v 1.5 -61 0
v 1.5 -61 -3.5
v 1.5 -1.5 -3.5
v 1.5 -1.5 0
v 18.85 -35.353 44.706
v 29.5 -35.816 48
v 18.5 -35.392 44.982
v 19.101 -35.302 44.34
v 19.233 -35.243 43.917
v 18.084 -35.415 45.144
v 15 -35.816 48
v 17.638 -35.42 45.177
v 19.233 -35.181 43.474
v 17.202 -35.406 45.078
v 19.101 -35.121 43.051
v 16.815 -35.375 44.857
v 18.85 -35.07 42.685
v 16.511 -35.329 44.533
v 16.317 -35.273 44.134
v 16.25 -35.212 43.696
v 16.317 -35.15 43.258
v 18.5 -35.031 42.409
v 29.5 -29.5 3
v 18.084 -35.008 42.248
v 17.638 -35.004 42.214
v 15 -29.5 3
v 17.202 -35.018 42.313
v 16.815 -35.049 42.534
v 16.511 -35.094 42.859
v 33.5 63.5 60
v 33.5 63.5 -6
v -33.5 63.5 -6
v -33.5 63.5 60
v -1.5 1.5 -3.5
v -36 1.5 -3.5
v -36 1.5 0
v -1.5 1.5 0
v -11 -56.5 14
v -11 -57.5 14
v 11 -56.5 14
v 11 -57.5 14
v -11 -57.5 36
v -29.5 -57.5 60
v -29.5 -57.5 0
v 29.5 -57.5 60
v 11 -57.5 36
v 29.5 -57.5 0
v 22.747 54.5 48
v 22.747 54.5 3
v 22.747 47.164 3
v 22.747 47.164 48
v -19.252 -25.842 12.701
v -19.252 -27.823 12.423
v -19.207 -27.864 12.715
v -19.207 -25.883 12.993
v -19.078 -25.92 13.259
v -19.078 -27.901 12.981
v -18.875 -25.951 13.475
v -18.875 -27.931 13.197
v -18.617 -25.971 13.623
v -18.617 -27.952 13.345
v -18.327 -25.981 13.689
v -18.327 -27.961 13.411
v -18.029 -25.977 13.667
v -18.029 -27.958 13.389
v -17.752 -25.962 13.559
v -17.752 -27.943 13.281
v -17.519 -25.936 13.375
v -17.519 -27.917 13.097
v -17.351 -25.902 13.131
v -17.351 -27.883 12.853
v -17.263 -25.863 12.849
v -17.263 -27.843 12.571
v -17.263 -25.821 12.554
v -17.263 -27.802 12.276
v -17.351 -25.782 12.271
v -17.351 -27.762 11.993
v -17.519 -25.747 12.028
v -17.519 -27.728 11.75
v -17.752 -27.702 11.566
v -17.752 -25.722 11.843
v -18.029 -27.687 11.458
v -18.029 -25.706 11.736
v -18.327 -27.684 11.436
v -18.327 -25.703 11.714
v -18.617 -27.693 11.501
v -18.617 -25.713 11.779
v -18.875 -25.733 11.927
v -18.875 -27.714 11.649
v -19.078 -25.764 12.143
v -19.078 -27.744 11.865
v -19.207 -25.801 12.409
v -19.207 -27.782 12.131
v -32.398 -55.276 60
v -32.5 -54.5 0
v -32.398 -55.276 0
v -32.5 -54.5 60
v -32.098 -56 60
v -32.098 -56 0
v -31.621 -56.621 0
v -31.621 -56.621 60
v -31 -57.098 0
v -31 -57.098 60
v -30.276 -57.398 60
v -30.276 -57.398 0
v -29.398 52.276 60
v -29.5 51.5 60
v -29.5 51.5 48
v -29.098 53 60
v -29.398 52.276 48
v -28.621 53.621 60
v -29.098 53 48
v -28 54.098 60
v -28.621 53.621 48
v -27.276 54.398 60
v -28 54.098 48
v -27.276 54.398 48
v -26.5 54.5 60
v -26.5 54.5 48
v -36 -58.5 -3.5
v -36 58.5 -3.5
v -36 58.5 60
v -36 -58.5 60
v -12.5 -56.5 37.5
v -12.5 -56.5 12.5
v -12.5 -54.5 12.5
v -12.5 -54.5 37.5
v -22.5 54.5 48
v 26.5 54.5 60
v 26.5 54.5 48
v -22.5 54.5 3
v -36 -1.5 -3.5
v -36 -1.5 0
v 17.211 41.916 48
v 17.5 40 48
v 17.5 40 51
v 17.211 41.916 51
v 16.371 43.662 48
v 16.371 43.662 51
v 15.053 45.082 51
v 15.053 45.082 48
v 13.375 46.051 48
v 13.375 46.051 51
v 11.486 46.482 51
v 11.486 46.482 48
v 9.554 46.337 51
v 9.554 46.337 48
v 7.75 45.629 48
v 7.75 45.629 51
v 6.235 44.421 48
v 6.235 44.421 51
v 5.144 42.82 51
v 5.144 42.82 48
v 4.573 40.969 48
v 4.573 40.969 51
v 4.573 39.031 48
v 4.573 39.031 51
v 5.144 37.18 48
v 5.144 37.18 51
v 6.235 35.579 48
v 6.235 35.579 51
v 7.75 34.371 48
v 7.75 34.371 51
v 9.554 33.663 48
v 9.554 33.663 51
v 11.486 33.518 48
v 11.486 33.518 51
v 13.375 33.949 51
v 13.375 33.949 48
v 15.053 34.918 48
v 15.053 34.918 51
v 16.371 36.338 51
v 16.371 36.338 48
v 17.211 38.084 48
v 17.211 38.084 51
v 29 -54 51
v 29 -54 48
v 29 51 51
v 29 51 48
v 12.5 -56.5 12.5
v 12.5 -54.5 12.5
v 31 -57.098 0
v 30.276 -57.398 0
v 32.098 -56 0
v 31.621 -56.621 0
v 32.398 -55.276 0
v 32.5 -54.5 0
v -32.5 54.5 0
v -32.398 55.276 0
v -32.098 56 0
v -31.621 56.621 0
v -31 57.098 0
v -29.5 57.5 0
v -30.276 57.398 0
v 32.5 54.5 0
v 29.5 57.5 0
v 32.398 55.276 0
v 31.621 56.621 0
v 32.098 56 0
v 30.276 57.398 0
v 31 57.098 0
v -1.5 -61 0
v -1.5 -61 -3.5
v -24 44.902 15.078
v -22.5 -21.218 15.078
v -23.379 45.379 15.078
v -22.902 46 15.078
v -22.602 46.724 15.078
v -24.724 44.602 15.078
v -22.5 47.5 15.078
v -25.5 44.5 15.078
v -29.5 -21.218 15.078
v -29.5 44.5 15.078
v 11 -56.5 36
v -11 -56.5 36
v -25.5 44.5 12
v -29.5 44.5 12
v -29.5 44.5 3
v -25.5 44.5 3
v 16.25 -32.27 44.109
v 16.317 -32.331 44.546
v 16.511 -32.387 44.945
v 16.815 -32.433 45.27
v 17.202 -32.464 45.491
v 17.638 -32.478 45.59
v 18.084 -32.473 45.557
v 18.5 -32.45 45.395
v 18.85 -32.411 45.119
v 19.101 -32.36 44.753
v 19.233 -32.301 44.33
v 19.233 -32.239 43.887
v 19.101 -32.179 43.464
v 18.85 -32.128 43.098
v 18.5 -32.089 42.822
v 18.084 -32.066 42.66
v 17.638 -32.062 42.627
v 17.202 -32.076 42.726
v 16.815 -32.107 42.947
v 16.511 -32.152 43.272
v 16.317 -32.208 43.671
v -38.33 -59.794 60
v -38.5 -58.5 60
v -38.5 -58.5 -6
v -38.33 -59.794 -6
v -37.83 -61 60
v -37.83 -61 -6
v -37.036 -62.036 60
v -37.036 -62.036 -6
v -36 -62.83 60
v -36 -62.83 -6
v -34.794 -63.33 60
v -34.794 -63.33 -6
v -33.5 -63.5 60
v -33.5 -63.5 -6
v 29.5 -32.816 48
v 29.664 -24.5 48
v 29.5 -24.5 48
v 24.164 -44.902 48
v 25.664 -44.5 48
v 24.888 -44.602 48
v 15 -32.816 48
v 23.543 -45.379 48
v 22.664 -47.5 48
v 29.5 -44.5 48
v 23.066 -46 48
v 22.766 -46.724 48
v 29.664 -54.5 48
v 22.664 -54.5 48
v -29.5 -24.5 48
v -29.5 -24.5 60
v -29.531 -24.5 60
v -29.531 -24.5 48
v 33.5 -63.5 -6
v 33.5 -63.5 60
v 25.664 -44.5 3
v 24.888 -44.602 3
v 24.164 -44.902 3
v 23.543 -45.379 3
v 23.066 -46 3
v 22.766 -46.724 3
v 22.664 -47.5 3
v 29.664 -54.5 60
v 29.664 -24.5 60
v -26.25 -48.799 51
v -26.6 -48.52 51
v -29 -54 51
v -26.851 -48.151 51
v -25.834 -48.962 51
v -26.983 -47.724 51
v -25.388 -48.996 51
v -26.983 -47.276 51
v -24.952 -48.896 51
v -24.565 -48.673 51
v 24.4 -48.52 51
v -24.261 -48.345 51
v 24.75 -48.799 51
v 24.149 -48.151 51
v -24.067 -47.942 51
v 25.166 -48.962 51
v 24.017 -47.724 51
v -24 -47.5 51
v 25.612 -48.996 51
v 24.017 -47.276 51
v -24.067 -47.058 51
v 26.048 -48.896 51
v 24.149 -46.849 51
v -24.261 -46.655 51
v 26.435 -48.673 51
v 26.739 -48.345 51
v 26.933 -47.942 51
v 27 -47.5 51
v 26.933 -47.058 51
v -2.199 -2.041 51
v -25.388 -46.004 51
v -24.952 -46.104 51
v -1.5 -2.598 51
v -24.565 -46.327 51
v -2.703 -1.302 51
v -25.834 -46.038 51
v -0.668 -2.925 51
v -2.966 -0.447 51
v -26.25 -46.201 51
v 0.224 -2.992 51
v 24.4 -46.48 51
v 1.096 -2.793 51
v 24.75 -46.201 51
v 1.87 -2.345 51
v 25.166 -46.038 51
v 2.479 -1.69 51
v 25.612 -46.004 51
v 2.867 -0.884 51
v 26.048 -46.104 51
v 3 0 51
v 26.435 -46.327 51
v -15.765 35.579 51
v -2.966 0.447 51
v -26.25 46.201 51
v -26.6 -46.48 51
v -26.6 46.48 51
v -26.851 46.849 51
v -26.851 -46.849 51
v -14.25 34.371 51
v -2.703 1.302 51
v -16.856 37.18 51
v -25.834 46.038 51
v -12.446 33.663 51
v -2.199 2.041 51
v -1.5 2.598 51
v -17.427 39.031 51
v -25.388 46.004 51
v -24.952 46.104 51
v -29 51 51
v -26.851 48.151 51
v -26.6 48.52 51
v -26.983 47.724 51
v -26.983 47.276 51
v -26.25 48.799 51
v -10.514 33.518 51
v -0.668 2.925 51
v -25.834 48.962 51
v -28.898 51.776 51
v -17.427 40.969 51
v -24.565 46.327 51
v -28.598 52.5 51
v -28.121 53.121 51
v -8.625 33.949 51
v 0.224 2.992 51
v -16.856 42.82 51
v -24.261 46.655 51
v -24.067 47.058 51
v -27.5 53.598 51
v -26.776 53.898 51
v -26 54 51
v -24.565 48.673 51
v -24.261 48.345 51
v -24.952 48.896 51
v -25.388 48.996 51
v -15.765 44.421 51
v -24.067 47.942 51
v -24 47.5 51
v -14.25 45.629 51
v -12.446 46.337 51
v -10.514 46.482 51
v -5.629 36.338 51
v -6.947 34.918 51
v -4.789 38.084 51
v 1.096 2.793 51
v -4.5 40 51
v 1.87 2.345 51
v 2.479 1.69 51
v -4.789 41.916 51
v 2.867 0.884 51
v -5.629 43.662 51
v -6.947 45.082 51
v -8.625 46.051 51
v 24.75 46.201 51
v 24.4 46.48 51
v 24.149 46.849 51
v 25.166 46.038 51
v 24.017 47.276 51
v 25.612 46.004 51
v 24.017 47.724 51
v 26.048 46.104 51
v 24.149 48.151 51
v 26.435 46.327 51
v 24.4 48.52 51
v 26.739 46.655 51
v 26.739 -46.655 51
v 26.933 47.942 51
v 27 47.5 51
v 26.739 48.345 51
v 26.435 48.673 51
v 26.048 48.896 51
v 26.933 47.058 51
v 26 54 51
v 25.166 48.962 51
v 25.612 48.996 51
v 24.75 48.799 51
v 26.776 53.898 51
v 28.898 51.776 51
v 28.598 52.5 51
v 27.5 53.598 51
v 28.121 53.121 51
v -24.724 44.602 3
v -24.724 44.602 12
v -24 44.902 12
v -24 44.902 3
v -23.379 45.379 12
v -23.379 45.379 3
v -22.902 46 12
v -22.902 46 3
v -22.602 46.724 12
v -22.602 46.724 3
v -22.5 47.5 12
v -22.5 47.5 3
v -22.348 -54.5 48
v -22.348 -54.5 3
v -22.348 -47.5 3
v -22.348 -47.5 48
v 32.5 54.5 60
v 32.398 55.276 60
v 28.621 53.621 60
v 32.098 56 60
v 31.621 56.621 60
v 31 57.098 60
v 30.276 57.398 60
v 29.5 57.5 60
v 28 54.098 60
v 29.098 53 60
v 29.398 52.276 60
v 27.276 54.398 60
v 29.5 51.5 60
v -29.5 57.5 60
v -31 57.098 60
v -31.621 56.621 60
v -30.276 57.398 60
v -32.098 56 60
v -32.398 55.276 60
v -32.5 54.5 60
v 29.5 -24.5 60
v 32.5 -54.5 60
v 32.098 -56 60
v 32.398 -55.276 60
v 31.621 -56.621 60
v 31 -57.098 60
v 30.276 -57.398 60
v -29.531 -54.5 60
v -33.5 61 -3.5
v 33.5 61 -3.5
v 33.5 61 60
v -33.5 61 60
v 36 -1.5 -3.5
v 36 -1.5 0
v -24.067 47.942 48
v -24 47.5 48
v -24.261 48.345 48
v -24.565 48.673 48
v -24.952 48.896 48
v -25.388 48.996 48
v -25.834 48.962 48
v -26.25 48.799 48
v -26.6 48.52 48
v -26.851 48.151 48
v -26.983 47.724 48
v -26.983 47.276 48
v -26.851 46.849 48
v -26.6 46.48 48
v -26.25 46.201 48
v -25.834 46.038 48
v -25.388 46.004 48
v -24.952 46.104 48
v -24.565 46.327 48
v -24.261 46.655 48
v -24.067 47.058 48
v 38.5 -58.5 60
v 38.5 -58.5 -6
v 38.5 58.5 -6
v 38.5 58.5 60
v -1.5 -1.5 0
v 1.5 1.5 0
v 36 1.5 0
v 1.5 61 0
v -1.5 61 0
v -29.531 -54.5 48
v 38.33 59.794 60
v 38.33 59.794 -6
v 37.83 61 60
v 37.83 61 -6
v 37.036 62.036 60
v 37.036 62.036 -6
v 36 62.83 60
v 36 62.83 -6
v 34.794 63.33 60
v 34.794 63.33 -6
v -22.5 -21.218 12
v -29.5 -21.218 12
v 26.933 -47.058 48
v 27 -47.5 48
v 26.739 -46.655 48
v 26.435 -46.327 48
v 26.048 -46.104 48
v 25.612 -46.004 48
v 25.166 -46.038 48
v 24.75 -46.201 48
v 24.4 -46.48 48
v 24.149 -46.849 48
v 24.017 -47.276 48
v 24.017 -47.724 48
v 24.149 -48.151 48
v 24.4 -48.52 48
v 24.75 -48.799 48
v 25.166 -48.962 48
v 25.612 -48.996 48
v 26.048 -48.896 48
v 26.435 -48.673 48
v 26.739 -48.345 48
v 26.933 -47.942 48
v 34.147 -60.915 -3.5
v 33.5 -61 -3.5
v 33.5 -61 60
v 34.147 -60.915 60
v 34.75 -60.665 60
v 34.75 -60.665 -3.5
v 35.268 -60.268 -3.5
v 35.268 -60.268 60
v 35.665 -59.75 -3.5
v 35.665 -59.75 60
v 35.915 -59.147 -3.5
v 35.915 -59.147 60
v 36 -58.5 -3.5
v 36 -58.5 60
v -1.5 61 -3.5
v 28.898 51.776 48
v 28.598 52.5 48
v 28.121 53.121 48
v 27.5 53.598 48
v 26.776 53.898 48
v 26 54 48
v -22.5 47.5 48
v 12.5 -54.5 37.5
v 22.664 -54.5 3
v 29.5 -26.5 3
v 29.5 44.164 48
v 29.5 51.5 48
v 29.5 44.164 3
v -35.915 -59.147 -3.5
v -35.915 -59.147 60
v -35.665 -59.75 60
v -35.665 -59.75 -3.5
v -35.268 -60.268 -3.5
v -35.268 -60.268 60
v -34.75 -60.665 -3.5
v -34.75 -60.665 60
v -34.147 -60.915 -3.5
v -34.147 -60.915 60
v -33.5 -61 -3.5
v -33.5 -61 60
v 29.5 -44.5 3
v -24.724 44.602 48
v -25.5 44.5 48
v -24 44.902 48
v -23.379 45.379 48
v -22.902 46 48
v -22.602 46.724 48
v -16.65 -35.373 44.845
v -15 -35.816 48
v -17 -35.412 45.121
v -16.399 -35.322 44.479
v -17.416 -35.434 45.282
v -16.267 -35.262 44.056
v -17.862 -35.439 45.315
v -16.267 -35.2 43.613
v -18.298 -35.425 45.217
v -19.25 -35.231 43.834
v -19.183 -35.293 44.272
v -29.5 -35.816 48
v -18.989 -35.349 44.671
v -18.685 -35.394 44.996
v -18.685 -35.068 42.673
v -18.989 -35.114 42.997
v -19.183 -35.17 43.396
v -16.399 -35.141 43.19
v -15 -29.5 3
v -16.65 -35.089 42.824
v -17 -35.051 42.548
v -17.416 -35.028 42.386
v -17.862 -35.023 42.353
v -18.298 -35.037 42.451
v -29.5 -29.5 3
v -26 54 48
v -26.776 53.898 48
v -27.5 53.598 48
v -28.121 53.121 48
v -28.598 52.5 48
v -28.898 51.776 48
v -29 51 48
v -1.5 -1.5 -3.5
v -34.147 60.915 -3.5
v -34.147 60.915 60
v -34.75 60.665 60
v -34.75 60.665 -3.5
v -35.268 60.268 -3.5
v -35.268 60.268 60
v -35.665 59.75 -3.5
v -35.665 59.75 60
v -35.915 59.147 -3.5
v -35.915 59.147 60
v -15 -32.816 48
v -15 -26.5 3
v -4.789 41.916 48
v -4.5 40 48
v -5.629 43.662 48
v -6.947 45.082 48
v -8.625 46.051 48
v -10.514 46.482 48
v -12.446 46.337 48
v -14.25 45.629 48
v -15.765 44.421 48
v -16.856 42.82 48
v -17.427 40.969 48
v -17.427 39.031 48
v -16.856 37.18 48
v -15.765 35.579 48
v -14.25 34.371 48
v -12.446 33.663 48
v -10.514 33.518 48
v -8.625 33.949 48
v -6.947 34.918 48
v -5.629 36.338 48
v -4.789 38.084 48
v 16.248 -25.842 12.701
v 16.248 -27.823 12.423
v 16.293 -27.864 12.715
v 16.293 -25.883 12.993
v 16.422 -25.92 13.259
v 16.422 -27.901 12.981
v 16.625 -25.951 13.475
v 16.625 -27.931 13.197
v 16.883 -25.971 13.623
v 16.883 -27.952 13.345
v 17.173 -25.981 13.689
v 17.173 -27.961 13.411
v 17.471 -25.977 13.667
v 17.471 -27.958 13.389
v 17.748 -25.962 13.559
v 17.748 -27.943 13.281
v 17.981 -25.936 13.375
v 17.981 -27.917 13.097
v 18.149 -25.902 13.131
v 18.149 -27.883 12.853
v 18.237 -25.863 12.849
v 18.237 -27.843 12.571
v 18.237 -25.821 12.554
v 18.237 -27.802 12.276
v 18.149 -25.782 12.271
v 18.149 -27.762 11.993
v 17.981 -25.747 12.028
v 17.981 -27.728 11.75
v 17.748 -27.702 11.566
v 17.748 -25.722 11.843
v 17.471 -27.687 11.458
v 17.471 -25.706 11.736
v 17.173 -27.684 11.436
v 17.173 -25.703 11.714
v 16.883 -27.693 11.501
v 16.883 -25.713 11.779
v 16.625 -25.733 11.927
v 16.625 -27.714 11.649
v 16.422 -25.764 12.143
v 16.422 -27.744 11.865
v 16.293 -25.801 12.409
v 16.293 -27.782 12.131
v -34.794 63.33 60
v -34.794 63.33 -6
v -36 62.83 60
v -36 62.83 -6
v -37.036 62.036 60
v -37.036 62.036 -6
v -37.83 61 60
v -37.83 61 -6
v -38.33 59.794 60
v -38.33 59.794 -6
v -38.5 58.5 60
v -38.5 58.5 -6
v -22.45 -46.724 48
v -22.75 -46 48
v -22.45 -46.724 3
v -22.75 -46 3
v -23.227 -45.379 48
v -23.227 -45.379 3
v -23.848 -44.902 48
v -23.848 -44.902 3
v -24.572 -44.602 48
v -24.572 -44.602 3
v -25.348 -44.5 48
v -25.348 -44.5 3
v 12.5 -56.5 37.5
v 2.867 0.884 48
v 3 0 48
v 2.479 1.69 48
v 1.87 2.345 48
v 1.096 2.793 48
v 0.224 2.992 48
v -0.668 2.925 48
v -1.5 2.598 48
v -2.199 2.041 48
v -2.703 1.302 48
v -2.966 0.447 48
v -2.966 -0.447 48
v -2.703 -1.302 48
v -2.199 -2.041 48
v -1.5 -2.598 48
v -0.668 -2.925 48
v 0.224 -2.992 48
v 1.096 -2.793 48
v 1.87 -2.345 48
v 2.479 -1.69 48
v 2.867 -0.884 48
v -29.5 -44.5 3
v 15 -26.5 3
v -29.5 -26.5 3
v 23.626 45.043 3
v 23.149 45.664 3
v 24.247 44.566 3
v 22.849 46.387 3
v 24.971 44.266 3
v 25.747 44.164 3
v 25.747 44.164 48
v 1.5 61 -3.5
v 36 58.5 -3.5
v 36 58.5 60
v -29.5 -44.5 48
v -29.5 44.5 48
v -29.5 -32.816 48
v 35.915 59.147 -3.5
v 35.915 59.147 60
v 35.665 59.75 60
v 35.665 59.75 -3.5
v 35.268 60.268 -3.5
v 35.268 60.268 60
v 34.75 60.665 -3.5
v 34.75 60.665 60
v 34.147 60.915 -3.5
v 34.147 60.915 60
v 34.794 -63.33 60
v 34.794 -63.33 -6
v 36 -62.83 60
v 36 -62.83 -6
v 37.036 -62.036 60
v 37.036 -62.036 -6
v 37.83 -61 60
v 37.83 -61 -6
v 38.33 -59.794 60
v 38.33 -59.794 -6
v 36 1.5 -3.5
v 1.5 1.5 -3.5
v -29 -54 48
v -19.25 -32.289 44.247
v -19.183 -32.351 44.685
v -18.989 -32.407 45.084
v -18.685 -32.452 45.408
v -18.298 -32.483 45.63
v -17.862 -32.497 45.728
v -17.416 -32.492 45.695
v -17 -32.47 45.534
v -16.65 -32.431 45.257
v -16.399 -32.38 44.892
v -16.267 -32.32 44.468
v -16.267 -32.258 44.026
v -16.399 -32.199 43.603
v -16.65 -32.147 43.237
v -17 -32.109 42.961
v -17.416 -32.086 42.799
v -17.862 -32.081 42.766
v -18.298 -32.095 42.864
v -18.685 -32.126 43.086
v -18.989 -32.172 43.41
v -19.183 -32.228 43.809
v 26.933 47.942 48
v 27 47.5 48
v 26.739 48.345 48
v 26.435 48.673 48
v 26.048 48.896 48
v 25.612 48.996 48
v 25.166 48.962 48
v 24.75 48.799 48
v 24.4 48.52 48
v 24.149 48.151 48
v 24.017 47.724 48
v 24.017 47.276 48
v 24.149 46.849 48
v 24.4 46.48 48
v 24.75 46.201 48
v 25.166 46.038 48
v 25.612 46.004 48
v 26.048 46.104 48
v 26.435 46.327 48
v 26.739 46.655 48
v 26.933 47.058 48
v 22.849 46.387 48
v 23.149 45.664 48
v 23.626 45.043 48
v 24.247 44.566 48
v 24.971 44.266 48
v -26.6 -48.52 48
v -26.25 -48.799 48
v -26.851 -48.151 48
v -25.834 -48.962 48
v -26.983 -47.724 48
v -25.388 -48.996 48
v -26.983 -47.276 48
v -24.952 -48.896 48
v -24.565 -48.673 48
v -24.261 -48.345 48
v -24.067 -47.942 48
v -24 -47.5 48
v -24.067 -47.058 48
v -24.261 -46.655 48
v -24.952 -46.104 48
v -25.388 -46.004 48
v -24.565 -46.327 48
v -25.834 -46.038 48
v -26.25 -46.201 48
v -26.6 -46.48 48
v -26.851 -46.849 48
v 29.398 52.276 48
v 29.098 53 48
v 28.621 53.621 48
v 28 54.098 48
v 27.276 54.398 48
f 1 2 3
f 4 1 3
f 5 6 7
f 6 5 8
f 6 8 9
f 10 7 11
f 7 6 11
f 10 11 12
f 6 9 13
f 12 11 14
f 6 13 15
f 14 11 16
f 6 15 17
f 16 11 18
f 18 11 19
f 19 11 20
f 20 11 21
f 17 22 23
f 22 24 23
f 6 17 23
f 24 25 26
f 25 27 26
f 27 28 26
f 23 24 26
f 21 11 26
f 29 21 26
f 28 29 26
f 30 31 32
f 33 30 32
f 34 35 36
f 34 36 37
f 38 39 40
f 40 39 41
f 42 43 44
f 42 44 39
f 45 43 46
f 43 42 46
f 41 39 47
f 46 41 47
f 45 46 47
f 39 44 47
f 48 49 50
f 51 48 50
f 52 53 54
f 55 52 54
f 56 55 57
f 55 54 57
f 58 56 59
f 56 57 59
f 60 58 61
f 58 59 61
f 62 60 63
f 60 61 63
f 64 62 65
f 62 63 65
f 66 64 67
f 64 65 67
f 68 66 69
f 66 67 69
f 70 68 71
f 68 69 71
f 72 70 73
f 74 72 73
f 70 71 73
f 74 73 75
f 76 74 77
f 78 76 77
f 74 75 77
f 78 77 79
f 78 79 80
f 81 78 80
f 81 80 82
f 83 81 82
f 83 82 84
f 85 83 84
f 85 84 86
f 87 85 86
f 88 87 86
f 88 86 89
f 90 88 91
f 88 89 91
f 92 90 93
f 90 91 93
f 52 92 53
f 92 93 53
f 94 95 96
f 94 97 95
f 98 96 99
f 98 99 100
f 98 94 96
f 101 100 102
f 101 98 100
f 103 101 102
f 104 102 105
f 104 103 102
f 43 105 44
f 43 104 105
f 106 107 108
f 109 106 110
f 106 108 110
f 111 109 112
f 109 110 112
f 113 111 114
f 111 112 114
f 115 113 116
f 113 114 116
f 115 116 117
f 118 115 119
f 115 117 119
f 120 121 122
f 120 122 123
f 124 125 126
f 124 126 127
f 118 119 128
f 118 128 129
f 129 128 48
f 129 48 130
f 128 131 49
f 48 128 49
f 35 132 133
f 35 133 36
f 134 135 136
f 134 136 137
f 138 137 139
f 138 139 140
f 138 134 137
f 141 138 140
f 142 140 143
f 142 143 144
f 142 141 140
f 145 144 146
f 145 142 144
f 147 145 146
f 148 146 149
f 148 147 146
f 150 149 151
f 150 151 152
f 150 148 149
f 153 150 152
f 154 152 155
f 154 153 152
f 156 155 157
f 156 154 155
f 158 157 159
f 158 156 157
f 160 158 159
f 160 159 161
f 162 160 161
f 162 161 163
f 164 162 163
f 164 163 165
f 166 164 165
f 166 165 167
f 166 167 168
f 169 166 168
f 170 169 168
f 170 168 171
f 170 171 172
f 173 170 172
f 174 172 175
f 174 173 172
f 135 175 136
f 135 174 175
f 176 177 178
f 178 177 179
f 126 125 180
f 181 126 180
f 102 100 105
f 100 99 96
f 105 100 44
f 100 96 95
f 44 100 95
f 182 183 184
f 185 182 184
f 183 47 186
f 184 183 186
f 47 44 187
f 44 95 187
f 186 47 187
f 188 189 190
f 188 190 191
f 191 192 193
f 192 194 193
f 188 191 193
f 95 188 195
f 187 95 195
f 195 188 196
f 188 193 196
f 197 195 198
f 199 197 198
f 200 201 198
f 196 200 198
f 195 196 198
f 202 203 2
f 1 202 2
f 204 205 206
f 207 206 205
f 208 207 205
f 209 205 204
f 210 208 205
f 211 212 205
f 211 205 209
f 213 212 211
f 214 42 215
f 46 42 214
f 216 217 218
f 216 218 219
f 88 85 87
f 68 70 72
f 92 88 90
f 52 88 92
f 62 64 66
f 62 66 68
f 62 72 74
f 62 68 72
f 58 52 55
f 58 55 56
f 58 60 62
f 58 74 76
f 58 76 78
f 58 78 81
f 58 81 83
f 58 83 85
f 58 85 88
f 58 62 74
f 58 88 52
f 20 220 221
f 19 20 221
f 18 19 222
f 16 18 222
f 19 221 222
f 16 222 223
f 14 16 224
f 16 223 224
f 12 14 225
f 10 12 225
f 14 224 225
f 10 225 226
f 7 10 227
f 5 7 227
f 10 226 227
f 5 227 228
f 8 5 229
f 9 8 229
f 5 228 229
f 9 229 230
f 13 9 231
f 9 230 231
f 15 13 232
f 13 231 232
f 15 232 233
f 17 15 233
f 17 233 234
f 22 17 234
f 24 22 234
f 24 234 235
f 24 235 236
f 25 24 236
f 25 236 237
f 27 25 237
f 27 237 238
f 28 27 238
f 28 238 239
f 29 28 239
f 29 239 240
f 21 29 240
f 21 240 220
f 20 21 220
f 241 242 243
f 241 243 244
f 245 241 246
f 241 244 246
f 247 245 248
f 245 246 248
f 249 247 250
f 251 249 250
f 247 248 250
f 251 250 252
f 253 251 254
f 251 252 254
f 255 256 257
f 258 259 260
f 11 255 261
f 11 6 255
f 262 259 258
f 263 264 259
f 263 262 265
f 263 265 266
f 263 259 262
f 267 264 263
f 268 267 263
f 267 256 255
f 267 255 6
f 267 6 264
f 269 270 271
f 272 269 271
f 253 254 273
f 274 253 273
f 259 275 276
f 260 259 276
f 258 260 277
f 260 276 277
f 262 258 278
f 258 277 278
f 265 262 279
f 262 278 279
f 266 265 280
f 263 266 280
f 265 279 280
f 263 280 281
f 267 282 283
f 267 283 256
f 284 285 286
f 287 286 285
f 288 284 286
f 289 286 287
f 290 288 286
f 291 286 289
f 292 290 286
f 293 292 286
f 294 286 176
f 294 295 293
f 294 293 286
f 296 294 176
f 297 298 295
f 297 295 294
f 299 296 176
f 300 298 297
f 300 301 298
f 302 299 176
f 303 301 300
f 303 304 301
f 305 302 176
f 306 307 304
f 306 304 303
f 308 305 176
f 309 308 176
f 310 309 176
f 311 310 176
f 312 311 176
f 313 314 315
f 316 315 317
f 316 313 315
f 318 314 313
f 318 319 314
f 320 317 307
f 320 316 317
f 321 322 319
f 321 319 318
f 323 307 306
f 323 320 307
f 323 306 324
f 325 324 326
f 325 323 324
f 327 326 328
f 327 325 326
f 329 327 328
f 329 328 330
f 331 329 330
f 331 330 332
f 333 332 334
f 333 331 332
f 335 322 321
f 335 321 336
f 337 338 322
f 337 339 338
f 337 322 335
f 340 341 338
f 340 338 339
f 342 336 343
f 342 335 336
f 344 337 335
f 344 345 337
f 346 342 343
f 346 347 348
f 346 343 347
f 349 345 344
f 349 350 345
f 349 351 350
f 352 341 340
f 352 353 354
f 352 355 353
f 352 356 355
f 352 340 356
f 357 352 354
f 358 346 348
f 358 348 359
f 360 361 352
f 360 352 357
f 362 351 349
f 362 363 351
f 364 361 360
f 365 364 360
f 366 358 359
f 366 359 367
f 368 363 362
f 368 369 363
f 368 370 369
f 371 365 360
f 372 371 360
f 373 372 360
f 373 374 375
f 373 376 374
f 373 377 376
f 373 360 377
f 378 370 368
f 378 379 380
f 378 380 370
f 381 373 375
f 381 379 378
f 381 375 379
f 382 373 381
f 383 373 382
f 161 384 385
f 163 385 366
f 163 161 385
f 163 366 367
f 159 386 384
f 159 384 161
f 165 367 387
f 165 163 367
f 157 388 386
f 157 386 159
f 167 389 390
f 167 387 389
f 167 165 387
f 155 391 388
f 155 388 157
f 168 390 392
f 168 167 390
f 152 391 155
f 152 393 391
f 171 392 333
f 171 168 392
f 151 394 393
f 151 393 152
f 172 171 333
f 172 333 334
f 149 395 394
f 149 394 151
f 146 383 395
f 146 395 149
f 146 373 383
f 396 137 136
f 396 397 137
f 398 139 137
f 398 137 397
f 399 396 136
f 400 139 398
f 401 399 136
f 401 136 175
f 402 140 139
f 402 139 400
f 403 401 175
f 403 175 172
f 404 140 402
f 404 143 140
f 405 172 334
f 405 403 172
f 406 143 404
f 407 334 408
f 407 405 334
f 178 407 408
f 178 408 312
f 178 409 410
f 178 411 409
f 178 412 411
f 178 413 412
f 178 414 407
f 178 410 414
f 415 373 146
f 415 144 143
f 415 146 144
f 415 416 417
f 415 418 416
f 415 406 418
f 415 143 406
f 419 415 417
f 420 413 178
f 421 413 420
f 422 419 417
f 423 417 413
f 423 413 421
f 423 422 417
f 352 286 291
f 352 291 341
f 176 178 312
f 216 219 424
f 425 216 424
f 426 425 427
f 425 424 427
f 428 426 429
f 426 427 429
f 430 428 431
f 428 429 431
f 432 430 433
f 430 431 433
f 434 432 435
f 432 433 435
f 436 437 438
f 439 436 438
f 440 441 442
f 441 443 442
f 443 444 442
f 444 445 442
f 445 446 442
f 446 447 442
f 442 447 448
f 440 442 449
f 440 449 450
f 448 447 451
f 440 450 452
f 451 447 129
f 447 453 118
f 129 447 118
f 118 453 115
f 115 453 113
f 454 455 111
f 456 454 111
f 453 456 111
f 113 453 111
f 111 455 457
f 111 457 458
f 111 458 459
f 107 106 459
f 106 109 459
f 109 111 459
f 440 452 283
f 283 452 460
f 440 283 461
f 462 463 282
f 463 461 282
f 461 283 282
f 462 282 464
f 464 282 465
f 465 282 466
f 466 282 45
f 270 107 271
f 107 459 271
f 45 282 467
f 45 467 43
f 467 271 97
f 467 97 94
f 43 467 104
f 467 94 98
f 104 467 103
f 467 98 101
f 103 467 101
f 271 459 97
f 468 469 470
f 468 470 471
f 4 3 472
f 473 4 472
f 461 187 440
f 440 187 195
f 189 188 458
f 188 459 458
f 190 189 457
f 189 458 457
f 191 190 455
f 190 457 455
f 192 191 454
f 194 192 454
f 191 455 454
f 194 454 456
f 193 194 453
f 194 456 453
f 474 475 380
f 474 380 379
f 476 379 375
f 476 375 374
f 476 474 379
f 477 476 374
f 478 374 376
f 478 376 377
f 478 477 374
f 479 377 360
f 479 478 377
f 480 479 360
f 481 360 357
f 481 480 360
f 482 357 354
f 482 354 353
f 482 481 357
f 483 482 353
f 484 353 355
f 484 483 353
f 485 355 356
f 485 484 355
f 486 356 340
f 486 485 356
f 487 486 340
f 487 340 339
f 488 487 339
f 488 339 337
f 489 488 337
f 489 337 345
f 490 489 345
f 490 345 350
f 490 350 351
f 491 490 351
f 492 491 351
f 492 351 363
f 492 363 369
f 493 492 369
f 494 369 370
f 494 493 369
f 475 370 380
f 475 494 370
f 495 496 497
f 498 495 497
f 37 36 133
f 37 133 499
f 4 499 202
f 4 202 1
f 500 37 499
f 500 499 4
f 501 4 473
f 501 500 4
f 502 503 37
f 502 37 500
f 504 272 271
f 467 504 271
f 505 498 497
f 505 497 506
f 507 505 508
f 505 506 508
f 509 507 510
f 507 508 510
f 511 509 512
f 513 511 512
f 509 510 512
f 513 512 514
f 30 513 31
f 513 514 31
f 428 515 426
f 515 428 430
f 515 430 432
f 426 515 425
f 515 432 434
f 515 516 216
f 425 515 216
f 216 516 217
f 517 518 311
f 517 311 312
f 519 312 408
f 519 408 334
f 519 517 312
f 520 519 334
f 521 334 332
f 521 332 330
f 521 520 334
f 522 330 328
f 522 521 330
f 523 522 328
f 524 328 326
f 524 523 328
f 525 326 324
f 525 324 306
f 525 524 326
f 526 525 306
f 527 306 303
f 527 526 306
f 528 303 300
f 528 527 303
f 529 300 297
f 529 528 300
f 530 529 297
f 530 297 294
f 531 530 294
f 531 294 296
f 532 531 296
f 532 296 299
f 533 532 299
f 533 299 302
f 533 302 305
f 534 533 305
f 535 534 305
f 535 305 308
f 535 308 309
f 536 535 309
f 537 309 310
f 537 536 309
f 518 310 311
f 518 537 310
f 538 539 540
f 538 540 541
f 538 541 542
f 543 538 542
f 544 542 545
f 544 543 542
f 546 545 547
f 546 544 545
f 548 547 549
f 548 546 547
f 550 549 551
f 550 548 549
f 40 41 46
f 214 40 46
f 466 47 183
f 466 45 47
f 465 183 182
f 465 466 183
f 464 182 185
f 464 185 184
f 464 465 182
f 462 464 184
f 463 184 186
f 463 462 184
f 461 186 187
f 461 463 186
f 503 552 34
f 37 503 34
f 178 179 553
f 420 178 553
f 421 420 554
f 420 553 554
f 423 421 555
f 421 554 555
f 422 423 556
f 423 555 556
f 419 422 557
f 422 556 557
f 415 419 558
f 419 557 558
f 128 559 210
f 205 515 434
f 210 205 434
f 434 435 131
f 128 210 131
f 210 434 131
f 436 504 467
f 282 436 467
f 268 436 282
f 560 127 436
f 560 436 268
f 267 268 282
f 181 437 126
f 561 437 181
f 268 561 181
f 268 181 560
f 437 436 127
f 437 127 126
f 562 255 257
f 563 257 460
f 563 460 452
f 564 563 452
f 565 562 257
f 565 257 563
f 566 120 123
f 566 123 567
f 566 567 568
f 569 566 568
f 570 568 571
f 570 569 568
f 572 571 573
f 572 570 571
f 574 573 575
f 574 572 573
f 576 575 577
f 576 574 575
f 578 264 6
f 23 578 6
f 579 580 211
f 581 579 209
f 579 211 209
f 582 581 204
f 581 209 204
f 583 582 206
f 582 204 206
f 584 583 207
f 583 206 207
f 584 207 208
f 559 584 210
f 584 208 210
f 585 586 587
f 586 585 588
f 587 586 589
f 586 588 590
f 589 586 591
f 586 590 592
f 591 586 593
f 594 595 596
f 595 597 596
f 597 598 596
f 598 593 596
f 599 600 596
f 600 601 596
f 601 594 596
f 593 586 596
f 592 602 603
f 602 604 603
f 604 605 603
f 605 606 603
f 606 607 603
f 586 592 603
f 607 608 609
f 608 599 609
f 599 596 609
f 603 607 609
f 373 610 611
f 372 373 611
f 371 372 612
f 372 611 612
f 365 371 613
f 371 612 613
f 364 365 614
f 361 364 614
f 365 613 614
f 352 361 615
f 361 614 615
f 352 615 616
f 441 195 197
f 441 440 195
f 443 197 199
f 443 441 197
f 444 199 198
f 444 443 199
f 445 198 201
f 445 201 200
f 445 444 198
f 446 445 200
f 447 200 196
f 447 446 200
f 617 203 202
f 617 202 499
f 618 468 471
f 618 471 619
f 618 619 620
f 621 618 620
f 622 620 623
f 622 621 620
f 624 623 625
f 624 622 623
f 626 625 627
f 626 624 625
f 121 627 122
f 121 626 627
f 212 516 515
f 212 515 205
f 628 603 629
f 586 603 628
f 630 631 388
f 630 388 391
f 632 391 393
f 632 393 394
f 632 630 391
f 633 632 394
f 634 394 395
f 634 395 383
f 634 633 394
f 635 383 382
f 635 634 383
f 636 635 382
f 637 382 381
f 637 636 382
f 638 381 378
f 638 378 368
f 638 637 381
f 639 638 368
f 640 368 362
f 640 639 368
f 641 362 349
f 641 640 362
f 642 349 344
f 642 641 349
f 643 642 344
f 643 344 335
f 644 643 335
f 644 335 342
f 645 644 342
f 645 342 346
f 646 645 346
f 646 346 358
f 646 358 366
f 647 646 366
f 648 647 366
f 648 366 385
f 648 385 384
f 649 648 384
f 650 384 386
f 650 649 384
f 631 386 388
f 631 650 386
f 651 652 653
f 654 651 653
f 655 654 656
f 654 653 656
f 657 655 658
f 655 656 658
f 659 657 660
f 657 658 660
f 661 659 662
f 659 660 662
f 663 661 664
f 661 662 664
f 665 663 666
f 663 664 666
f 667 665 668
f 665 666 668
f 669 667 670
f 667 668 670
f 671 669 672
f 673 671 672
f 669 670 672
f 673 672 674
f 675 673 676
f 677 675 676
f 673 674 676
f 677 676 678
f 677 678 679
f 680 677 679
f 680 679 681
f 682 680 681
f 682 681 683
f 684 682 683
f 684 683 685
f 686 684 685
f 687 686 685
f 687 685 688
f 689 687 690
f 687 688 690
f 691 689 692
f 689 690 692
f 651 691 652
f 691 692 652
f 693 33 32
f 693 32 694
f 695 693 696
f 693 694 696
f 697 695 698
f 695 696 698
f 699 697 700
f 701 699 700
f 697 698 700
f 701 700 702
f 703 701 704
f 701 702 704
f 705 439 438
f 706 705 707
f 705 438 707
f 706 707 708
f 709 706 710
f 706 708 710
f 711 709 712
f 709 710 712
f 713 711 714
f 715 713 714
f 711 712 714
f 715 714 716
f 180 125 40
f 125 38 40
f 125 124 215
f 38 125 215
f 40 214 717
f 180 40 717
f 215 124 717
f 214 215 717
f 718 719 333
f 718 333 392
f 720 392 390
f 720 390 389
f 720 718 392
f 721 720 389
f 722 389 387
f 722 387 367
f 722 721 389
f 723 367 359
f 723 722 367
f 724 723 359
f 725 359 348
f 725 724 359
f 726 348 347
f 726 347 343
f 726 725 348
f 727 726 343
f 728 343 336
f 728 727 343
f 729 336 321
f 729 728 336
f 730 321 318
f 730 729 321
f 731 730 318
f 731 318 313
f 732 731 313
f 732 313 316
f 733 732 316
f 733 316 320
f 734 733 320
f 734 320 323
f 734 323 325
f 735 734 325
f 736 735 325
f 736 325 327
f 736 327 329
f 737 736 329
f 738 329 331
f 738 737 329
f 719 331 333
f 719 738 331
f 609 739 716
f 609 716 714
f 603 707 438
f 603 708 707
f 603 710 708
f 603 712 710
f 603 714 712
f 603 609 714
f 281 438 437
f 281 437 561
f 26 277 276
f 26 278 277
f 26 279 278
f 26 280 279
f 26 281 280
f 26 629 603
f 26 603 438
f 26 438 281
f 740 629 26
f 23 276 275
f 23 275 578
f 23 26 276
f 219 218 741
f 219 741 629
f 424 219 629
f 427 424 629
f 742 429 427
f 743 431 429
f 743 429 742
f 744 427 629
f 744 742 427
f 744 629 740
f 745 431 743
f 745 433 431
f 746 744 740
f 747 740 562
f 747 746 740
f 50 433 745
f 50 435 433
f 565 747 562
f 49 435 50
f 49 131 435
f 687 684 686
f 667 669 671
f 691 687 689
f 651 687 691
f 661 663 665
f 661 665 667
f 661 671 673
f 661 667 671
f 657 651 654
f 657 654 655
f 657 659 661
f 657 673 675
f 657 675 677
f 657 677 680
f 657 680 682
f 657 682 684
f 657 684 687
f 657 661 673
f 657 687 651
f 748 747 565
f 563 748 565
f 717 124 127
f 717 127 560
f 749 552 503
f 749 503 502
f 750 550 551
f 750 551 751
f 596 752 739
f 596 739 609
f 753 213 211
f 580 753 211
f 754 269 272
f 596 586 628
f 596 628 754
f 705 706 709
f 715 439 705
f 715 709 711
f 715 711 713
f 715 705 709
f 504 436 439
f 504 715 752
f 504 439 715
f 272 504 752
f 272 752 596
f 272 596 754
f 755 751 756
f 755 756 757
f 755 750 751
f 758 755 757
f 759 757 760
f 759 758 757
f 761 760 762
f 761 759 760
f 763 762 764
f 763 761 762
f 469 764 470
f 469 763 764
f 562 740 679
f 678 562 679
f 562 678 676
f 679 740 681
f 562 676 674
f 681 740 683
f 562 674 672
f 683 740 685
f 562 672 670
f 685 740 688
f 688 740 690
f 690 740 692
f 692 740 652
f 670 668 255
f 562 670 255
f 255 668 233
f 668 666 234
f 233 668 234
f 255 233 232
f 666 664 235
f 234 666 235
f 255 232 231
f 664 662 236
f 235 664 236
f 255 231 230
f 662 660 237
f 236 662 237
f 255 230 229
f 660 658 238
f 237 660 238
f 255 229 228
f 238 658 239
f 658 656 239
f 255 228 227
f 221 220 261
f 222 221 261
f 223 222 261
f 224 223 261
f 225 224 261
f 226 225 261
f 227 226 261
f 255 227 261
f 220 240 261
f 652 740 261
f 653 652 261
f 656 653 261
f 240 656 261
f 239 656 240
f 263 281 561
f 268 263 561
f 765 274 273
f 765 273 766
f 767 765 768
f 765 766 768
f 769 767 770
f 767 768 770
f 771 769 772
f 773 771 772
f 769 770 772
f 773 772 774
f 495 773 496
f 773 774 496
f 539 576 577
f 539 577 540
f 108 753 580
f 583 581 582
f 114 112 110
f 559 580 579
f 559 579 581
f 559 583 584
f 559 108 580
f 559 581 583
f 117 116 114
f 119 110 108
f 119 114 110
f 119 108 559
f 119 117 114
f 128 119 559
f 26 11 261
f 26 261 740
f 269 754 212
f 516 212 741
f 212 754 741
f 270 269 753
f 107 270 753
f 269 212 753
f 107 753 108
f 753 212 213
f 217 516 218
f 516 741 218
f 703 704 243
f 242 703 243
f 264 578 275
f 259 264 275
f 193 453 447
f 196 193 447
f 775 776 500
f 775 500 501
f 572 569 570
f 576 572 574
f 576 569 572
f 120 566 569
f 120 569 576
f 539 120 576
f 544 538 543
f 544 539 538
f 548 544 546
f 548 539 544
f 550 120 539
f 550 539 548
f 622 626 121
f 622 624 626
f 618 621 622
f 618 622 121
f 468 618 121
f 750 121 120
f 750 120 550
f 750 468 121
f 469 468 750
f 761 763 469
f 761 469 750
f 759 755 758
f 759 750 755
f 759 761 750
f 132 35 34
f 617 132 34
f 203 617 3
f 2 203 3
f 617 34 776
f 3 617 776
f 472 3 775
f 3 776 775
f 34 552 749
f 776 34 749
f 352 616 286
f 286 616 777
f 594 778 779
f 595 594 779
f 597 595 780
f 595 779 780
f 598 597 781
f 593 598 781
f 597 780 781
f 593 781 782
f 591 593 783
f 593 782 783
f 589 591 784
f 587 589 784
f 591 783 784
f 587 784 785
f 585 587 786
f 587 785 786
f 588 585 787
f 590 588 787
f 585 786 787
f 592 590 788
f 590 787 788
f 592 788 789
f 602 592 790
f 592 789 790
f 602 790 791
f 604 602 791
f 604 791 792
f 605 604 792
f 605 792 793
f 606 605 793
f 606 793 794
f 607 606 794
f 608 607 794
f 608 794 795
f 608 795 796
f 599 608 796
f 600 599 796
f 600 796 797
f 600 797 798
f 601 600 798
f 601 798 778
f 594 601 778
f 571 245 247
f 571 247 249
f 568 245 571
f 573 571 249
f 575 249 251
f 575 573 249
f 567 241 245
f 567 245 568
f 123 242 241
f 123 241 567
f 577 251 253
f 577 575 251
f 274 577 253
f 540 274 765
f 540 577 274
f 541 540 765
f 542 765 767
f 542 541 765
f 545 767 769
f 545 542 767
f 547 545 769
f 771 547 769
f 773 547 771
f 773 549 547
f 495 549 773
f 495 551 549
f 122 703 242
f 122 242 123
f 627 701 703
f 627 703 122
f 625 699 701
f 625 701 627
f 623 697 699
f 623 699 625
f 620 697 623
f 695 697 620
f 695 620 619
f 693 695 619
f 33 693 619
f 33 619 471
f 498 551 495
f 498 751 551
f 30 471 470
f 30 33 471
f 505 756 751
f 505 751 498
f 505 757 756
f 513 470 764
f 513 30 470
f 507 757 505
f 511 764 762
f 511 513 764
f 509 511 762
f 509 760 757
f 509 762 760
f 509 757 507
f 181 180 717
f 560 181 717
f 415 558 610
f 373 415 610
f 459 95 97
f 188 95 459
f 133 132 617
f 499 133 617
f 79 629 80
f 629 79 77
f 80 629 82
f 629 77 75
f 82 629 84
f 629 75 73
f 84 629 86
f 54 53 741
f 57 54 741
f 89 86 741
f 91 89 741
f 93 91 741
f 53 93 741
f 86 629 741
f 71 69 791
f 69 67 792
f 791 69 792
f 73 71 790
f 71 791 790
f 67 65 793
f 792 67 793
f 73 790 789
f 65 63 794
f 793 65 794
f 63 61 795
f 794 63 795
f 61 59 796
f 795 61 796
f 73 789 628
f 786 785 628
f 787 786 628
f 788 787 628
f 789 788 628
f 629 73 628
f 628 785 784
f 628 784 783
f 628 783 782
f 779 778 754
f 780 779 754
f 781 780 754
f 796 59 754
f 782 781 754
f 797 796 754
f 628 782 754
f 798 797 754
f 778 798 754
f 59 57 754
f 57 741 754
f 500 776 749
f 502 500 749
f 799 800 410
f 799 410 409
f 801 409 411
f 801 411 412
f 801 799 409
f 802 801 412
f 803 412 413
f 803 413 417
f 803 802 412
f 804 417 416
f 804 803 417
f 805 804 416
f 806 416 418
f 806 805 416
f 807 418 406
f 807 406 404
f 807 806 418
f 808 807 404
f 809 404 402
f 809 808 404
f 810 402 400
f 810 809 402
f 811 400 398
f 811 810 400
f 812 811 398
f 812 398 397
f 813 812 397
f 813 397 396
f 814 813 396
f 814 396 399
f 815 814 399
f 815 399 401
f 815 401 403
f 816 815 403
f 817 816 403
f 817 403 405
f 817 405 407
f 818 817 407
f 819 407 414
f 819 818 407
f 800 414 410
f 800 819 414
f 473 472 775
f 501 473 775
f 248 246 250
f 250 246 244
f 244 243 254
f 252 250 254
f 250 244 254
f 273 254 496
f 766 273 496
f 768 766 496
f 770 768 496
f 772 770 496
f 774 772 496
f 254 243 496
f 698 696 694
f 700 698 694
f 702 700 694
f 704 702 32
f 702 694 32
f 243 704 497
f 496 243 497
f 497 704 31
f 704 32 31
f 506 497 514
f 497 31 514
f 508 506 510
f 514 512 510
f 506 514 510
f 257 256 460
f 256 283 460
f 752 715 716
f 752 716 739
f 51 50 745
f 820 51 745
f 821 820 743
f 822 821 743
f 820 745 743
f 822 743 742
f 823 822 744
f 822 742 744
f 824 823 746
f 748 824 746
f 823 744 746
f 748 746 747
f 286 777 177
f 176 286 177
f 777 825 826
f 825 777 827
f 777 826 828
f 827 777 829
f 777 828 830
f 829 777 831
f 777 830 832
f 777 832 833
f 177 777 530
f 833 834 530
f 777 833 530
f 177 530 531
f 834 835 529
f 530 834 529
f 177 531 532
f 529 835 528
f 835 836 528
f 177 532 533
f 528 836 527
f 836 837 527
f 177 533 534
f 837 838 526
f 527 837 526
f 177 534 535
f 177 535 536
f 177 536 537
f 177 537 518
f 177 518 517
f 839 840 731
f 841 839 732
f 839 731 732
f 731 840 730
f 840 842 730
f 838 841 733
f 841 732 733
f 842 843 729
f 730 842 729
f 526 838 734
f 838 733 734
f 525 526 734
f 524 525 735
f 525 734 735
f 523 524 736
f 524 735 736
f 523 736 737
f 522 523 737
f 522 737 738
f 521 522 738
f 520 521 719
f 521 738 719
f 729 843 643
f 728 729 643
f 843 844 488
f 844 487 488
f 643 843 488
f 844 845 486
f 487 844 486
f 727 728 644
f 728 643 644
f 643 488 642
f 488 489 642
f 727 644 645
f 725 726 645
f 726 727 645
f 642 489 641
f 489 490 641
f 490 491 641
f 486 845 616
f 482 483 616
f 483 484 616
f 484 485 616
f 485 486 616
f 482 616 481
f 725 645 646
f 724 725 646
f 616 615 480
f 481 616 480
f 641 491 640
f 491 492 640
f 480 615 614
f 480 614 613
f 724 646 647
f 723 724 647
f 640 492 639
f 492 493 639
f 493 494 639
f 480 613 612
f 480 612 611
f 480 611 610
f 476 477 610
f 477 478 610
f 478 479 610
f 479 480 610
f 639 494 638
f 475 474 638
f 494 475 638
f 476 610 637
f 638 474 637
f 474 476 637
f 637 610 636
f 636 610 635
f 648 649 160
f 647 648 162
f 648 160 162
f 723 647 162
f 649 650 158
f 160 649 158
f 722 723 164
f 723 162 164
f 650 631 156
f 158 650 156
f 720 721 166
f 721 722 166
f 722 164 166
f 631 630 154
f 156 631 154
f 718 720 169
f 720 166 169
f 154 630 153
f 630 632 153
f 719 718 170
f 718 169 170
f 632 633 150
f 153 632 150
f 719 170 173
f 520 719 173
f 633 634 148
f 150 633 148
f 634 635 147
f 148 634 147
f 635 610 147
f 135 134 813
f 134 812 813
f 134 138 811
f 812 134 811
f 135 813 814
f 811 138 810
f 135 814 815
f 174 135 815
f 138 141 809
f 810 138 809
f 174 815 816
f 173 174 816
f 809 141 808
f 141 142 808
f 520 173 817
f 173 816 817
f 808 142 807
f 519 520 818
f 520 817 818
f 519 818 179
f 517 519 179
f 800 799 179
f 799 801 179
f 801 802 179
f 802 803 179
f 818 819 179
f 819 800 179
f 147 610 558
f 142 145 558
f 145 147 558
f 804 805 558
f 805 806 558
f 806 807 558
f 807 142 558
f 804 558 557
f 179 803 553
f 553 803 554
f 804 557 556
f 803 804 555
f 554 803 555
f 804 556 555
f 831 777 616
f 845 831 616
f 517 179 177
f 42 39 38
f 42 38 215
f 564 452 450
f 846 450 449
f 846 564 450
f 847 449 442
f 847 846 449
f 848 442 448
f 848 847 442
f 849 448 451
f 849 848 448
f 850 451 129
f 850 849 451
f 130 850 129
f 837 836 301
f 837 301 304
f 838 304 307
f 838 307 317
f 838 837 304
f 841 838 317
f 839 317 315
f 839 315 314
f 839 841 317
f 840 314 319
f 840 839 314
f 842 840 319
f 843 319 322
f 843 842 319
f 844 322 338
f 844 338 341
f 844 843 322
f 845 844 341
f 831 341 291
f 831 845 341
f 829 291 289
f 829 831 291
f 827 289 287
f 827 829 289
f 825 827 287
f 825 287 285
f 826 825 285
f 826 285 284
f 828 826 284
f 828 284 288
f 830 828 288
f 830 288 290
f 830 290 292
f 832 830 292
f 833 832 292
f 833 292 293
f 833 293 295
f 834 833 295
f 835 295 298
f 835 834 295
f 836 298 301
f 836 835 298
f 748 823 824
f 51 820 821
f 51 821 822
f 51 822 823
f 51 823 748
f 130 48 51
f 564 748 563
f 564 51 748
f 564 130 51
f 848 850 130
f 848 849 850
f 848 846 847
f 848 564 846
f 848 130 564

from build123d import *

# Parameters (mm, degrees)
F2_DEPTH  = 66
F3_T      = -2.5
F4_W      = 65
F4_H      = 115
F5_DEPTH  = 60
F6_T      = -3
F7_R      = 3
F9_DEPTH  = 60
F11_DEPTH = 30
F12_W     = 25
F12_H     = 25
F13_DEPTH = 25
F14_W     = 30.3293950856
F14_H     = 30.3293950856
F14_W_2   = 22
F14_H_2   = 22
F15_DEPTH = 1
F16_R     = 1.5
F17_DEPTH = 5
F18_R     = 1
F19_DEPTH = 2
F20_W     = 75.8937858045
F20_H     = 3.0775591731
F21_DEPTH = 7
F23_DEPTH = 45
F24_R     = 1.5
F24_R_2   = 6.5
F24_R_3   = 3
F25_DEPTH = 3
F26_W     = 3
F26_H     = 59.5
F26_H_2   = 3
F26_W_2   = 34.5
F27_DEPTH = 3.5


with BuildPart() as f2:
    # F1 (on offset) → F2 (new body)
    with BuildSketch(Plane.XY.offset(-6)):
        with BuildLine():
            Line((33.5, 63.5), (-33.5, 63.5))
            ThreePointArc((-33.5, 63.5), (-37.0355339059, 62.0355339059), (-38.5, 58.5))
            Line((-38.5, 58.5), (-38.5, -58.5))
            ThreePointArc((-38.5, -58.5), (-37.0355339059, -62.0355339059), (-33.5, -63.5))
            Line((-33.5, -63.5), (33.5, -63.5))
            ThreePointArc((33.5, -63.5), (37.0355339059, -62.0355339059), (38.5, -58.5))
            Line((38.5, -58.5), (38.5, 58.5))
            ThreePointArc((38.5, 58.5), (37.0355339059, 62.0355339059), (33.5, 63.5))
        make_face()
    extrude(amount=F2_DEPTH)

    # F3
    f3_openings = [f2.faces().sort_by_distance(p)[0] for p in [
        (0, 0, 60),
    ]]
    offset(amount=F3_T, openings=f3_openings)


with BuildPart() as f5:
    # F4 (on Top) → F5 (new body)
    with BuildSketch(Plane.XY):
        Rectangle(F4_W, F4_H)
    extrude(amount=F5_DEPTH)

    # F6
    f6_openings = [f5.faces().sort_by_distance(p)[0] for p in [
        (0, 0, 60),
    ]]
    offset(amount=F6_T, openings=f6_openings)

    # F7
    f7_edges = [f5.edges().sort_by_distance(p)[0] for p in [
        (-29.5, 54.5, 31.5),
        (32.5, -57.5, 30),
        (-32.5, -57.5, 30),
        (32.5, 57.5, 30),
        (29.5, -54.5, 31.5),
        (-32.5, 57.5, 30),
        (29.5, 54.5, 31.5),
        (-29.5, -54.5, 31.5),
    ]]
    fillet(f7_edges, radius=F7_R)

    # F8 (on face) → F9 (join)
    with BuildSketch(Plane.YZ.offset(-29.5)):
        Polygon((-37.5, 60), (-29.5, 3), (-26.5, 3), (-34.5, 60), align=None)
    extrude(amount=F9_DEPTH)

    # F10 (on face) → F11 (cut)
    with BuildSketch(Plane(origin=(0, -54.5, 0), x_dir=(-1, 0, 0), z_dir=(0, 1, 0))):
        Polygon((-15, 3), (15, 3), (15, 48), (29.5312516391, 48), (29.5312516391, 69.1723003983), (-29.6642743051, 69.1723003983), (-29.6642743051, 48), (-15, 48), align=None)
    extrude(amount=F11_DEPTH, mode=Mode.SUBTRACT)

    # F12 (on face) → F13 (cut)
    with BuildSketch(Plane.XZ.offset(57.5)):
        with Locations((0, 25)):
            Rectangle(F12_W, F12_H)
    extrude(amount=-F13_DEPTH, mode=Mode.SUBTRACT)

    # F14 (on face) → F15 (join)
    with BuildSketch(Plane.XZ.offset(57.5)):
        with Locations((0.3990717232, 24.6093776077)):
            Rectangle(F14_W, F14_H)
        with Locations((0, 25)):
            Rectangle(F14_W_2, F14_H_2, mode=Mode.SUBTRACT)
    extrude(amount=-F15_DEPTH)

    # F16 (on face) → F17 (cut)
    with BuildSketch(Plane(origin=(0, -25.5751584666, -3.5894959251), x_dir=(-1, 0, 0), z_dir=(0, 0.9902939772, 0.1389886284))):
        with Locations((-17.75, 48.1656454504)):
            Circle(F16_R)
        with Locations((17.75, 48.3054479149)):
            Circle(F16_R)
    extrude(amount=-F17_DEPTH, mode=Mode.SUBTRACT)

    # F18 (on face) → F19 (join)
    with BuildSketch(Plane(origin=(0, -25.5751584666, -3.5894959251), x_dir=(-1, 0, 0), z_dir=(0, 0.9902939772, 0.1389886284))):
        with Locations((-17.2482031414, 16.1695800686)):
            Circle(F18_R)
        with Locations((18.2517968586, 16.1695800686)):
            Circle(F18_R)
    extrude(amount=F19_DEPTH)

    # F20 (on face) → F21 (join)
    with BuildSketch(Plane.YZ.offset(-29.5)):
        with Locations((16.7292747647, 13.5387795866)):
            Rectangle(F20_W, F20_H)
    extrude(amount=F21_DEPTH)

    # F22 (on face) → F23 (join)
    with BuildSketch(Plane.XY.offset(3)):
        with BuildLine():
            Line((-22.5, 54.5), (-29.5, 54.5))
            Line((-29.5, 54.5), (-29.5, 44.5))
            Line((-29.5, 44.5), (-25.5, 44.5))
            ThreePointArc((-25.5, 44.5), (-23.3786796564, 45.3786796564), (-22.5, 47.5))
            Line((-22.5, 47.5), (-22.5, 54.5))
        make_face()
        with BuildLine():
            Line((29.7470435202, 54.5), (22.7470435202, 54.5))
            Line((22.7470435202, 54.5), (22.7470435202, 47.1638529301))
            ThreePointArc((22.7470435202, 47.1638529301), (23.6257231767, 45.0425325865), (25.7470435202, 44.1638529301))
            Line((25.7470435202, 44.1638529301), (29.7470435202, 44.1638529301))
            Line((29.7470435202, 44.1638529301), (29.7470435202, 54.5))
        make_face()
        with BuildLine():
            Line((-29.5, -44.5), (-29.5, -54.5))
            Line((-29.5, -54.5), (-22.3479736596, -54.5))
            Line((-22.3479736596, -54.5), (-22.3479736596, -47.5))
            ThreePointArc((-22.3479736596, -47.5), (-23.2266533161, -45.3786796564), (-25.3479736596, -44.5))
            Line((-25.3479736596, -44.5), (-29.5, -44.5))
        make_face()
        with BuildLine():
            Line((22.6642743051, -54.5), (29.6642743051, -54.5))
            Line((29.6642743051, -54.5), (29.6642743051, -44.5))
            Line((29.6642743051, -44.5), (25.6642743051, -44.5))
            ThreePointArc((25.6642743051, -44.5), (23.5429539615, -45.3786796564), (22.6642743051, -47.5))
            Line((22.6642743051, -47.5), (22.6642743051, -54.5))
        make_face()
    extrude(amount=F23_DEPTH)


with BuildPart() as f25:
    # F24 (on face) → F25 (new body)
    with BuildSketch(Plane.XY.offset(48)):
        with BuildLine():
            Line((26, 54), (-26, 54))
            ThreePointArc((-26, 54), (-28.1213203436, 53.1213203436), (-29, 51))
            Line((-29, 51), (-29, -54))
            Line((-29, -54), (29, -54))
            Line((29, -54), (29, 51))
            ThreePointArc((29, 51), (28.1213203436, 53.1213203436), (26, 54))
        make_face()
        with Locations((-25.5, -47.5)):
            Circle(F24_R, mode=Mode.SUBTRACT)
        with Locations((25.5, -47.5)):
            Circle(F24_R, mode=Mode.SUBTRACT)
        with Locations((-25.5, 47.5)):
            Circle(F24_R, mode=Mode.SUBTRACT)
        with Locations((-11, 40)):
            Circle(F24_R_2, mode=Mode.SUBTRACT)
        Circle(F24_R_3, mode=Mode.SUBTRACT)
        with Locations((11, 40)):
            Circle(F24_R_2, mode=Mode.SUBTRACT)
        with Locations((25.5, 47.5)):
            Circle(F24_R, mode=Mode.SUBTRACT)
    extrude(amount=F25_DEPTH)


with BuildPart() as f27:
    # F26 (on face) → F27 (new body)
    with BuildSketch(Plane.XY.offset(-3.5)):
        with Locations((0, 31.25)):
            Rectangle(F26_W, F26_H)
        Rectangle(F26_W, F26_H_2)
        with Locations((-18.75, 0)):
            Rectangle(F26_W_2, F26_H_2)
        with Locations((18.75, 0)):
            Rectangle(F26_W_2, F26_H_2)
        with Locations((0, -31.25)):
            Rectangle(F26_W, F26_H)
    extrude(amount=F27_DEPTH)


solid = Compound([f2.part, f5.part, f25.part, f27.part])
